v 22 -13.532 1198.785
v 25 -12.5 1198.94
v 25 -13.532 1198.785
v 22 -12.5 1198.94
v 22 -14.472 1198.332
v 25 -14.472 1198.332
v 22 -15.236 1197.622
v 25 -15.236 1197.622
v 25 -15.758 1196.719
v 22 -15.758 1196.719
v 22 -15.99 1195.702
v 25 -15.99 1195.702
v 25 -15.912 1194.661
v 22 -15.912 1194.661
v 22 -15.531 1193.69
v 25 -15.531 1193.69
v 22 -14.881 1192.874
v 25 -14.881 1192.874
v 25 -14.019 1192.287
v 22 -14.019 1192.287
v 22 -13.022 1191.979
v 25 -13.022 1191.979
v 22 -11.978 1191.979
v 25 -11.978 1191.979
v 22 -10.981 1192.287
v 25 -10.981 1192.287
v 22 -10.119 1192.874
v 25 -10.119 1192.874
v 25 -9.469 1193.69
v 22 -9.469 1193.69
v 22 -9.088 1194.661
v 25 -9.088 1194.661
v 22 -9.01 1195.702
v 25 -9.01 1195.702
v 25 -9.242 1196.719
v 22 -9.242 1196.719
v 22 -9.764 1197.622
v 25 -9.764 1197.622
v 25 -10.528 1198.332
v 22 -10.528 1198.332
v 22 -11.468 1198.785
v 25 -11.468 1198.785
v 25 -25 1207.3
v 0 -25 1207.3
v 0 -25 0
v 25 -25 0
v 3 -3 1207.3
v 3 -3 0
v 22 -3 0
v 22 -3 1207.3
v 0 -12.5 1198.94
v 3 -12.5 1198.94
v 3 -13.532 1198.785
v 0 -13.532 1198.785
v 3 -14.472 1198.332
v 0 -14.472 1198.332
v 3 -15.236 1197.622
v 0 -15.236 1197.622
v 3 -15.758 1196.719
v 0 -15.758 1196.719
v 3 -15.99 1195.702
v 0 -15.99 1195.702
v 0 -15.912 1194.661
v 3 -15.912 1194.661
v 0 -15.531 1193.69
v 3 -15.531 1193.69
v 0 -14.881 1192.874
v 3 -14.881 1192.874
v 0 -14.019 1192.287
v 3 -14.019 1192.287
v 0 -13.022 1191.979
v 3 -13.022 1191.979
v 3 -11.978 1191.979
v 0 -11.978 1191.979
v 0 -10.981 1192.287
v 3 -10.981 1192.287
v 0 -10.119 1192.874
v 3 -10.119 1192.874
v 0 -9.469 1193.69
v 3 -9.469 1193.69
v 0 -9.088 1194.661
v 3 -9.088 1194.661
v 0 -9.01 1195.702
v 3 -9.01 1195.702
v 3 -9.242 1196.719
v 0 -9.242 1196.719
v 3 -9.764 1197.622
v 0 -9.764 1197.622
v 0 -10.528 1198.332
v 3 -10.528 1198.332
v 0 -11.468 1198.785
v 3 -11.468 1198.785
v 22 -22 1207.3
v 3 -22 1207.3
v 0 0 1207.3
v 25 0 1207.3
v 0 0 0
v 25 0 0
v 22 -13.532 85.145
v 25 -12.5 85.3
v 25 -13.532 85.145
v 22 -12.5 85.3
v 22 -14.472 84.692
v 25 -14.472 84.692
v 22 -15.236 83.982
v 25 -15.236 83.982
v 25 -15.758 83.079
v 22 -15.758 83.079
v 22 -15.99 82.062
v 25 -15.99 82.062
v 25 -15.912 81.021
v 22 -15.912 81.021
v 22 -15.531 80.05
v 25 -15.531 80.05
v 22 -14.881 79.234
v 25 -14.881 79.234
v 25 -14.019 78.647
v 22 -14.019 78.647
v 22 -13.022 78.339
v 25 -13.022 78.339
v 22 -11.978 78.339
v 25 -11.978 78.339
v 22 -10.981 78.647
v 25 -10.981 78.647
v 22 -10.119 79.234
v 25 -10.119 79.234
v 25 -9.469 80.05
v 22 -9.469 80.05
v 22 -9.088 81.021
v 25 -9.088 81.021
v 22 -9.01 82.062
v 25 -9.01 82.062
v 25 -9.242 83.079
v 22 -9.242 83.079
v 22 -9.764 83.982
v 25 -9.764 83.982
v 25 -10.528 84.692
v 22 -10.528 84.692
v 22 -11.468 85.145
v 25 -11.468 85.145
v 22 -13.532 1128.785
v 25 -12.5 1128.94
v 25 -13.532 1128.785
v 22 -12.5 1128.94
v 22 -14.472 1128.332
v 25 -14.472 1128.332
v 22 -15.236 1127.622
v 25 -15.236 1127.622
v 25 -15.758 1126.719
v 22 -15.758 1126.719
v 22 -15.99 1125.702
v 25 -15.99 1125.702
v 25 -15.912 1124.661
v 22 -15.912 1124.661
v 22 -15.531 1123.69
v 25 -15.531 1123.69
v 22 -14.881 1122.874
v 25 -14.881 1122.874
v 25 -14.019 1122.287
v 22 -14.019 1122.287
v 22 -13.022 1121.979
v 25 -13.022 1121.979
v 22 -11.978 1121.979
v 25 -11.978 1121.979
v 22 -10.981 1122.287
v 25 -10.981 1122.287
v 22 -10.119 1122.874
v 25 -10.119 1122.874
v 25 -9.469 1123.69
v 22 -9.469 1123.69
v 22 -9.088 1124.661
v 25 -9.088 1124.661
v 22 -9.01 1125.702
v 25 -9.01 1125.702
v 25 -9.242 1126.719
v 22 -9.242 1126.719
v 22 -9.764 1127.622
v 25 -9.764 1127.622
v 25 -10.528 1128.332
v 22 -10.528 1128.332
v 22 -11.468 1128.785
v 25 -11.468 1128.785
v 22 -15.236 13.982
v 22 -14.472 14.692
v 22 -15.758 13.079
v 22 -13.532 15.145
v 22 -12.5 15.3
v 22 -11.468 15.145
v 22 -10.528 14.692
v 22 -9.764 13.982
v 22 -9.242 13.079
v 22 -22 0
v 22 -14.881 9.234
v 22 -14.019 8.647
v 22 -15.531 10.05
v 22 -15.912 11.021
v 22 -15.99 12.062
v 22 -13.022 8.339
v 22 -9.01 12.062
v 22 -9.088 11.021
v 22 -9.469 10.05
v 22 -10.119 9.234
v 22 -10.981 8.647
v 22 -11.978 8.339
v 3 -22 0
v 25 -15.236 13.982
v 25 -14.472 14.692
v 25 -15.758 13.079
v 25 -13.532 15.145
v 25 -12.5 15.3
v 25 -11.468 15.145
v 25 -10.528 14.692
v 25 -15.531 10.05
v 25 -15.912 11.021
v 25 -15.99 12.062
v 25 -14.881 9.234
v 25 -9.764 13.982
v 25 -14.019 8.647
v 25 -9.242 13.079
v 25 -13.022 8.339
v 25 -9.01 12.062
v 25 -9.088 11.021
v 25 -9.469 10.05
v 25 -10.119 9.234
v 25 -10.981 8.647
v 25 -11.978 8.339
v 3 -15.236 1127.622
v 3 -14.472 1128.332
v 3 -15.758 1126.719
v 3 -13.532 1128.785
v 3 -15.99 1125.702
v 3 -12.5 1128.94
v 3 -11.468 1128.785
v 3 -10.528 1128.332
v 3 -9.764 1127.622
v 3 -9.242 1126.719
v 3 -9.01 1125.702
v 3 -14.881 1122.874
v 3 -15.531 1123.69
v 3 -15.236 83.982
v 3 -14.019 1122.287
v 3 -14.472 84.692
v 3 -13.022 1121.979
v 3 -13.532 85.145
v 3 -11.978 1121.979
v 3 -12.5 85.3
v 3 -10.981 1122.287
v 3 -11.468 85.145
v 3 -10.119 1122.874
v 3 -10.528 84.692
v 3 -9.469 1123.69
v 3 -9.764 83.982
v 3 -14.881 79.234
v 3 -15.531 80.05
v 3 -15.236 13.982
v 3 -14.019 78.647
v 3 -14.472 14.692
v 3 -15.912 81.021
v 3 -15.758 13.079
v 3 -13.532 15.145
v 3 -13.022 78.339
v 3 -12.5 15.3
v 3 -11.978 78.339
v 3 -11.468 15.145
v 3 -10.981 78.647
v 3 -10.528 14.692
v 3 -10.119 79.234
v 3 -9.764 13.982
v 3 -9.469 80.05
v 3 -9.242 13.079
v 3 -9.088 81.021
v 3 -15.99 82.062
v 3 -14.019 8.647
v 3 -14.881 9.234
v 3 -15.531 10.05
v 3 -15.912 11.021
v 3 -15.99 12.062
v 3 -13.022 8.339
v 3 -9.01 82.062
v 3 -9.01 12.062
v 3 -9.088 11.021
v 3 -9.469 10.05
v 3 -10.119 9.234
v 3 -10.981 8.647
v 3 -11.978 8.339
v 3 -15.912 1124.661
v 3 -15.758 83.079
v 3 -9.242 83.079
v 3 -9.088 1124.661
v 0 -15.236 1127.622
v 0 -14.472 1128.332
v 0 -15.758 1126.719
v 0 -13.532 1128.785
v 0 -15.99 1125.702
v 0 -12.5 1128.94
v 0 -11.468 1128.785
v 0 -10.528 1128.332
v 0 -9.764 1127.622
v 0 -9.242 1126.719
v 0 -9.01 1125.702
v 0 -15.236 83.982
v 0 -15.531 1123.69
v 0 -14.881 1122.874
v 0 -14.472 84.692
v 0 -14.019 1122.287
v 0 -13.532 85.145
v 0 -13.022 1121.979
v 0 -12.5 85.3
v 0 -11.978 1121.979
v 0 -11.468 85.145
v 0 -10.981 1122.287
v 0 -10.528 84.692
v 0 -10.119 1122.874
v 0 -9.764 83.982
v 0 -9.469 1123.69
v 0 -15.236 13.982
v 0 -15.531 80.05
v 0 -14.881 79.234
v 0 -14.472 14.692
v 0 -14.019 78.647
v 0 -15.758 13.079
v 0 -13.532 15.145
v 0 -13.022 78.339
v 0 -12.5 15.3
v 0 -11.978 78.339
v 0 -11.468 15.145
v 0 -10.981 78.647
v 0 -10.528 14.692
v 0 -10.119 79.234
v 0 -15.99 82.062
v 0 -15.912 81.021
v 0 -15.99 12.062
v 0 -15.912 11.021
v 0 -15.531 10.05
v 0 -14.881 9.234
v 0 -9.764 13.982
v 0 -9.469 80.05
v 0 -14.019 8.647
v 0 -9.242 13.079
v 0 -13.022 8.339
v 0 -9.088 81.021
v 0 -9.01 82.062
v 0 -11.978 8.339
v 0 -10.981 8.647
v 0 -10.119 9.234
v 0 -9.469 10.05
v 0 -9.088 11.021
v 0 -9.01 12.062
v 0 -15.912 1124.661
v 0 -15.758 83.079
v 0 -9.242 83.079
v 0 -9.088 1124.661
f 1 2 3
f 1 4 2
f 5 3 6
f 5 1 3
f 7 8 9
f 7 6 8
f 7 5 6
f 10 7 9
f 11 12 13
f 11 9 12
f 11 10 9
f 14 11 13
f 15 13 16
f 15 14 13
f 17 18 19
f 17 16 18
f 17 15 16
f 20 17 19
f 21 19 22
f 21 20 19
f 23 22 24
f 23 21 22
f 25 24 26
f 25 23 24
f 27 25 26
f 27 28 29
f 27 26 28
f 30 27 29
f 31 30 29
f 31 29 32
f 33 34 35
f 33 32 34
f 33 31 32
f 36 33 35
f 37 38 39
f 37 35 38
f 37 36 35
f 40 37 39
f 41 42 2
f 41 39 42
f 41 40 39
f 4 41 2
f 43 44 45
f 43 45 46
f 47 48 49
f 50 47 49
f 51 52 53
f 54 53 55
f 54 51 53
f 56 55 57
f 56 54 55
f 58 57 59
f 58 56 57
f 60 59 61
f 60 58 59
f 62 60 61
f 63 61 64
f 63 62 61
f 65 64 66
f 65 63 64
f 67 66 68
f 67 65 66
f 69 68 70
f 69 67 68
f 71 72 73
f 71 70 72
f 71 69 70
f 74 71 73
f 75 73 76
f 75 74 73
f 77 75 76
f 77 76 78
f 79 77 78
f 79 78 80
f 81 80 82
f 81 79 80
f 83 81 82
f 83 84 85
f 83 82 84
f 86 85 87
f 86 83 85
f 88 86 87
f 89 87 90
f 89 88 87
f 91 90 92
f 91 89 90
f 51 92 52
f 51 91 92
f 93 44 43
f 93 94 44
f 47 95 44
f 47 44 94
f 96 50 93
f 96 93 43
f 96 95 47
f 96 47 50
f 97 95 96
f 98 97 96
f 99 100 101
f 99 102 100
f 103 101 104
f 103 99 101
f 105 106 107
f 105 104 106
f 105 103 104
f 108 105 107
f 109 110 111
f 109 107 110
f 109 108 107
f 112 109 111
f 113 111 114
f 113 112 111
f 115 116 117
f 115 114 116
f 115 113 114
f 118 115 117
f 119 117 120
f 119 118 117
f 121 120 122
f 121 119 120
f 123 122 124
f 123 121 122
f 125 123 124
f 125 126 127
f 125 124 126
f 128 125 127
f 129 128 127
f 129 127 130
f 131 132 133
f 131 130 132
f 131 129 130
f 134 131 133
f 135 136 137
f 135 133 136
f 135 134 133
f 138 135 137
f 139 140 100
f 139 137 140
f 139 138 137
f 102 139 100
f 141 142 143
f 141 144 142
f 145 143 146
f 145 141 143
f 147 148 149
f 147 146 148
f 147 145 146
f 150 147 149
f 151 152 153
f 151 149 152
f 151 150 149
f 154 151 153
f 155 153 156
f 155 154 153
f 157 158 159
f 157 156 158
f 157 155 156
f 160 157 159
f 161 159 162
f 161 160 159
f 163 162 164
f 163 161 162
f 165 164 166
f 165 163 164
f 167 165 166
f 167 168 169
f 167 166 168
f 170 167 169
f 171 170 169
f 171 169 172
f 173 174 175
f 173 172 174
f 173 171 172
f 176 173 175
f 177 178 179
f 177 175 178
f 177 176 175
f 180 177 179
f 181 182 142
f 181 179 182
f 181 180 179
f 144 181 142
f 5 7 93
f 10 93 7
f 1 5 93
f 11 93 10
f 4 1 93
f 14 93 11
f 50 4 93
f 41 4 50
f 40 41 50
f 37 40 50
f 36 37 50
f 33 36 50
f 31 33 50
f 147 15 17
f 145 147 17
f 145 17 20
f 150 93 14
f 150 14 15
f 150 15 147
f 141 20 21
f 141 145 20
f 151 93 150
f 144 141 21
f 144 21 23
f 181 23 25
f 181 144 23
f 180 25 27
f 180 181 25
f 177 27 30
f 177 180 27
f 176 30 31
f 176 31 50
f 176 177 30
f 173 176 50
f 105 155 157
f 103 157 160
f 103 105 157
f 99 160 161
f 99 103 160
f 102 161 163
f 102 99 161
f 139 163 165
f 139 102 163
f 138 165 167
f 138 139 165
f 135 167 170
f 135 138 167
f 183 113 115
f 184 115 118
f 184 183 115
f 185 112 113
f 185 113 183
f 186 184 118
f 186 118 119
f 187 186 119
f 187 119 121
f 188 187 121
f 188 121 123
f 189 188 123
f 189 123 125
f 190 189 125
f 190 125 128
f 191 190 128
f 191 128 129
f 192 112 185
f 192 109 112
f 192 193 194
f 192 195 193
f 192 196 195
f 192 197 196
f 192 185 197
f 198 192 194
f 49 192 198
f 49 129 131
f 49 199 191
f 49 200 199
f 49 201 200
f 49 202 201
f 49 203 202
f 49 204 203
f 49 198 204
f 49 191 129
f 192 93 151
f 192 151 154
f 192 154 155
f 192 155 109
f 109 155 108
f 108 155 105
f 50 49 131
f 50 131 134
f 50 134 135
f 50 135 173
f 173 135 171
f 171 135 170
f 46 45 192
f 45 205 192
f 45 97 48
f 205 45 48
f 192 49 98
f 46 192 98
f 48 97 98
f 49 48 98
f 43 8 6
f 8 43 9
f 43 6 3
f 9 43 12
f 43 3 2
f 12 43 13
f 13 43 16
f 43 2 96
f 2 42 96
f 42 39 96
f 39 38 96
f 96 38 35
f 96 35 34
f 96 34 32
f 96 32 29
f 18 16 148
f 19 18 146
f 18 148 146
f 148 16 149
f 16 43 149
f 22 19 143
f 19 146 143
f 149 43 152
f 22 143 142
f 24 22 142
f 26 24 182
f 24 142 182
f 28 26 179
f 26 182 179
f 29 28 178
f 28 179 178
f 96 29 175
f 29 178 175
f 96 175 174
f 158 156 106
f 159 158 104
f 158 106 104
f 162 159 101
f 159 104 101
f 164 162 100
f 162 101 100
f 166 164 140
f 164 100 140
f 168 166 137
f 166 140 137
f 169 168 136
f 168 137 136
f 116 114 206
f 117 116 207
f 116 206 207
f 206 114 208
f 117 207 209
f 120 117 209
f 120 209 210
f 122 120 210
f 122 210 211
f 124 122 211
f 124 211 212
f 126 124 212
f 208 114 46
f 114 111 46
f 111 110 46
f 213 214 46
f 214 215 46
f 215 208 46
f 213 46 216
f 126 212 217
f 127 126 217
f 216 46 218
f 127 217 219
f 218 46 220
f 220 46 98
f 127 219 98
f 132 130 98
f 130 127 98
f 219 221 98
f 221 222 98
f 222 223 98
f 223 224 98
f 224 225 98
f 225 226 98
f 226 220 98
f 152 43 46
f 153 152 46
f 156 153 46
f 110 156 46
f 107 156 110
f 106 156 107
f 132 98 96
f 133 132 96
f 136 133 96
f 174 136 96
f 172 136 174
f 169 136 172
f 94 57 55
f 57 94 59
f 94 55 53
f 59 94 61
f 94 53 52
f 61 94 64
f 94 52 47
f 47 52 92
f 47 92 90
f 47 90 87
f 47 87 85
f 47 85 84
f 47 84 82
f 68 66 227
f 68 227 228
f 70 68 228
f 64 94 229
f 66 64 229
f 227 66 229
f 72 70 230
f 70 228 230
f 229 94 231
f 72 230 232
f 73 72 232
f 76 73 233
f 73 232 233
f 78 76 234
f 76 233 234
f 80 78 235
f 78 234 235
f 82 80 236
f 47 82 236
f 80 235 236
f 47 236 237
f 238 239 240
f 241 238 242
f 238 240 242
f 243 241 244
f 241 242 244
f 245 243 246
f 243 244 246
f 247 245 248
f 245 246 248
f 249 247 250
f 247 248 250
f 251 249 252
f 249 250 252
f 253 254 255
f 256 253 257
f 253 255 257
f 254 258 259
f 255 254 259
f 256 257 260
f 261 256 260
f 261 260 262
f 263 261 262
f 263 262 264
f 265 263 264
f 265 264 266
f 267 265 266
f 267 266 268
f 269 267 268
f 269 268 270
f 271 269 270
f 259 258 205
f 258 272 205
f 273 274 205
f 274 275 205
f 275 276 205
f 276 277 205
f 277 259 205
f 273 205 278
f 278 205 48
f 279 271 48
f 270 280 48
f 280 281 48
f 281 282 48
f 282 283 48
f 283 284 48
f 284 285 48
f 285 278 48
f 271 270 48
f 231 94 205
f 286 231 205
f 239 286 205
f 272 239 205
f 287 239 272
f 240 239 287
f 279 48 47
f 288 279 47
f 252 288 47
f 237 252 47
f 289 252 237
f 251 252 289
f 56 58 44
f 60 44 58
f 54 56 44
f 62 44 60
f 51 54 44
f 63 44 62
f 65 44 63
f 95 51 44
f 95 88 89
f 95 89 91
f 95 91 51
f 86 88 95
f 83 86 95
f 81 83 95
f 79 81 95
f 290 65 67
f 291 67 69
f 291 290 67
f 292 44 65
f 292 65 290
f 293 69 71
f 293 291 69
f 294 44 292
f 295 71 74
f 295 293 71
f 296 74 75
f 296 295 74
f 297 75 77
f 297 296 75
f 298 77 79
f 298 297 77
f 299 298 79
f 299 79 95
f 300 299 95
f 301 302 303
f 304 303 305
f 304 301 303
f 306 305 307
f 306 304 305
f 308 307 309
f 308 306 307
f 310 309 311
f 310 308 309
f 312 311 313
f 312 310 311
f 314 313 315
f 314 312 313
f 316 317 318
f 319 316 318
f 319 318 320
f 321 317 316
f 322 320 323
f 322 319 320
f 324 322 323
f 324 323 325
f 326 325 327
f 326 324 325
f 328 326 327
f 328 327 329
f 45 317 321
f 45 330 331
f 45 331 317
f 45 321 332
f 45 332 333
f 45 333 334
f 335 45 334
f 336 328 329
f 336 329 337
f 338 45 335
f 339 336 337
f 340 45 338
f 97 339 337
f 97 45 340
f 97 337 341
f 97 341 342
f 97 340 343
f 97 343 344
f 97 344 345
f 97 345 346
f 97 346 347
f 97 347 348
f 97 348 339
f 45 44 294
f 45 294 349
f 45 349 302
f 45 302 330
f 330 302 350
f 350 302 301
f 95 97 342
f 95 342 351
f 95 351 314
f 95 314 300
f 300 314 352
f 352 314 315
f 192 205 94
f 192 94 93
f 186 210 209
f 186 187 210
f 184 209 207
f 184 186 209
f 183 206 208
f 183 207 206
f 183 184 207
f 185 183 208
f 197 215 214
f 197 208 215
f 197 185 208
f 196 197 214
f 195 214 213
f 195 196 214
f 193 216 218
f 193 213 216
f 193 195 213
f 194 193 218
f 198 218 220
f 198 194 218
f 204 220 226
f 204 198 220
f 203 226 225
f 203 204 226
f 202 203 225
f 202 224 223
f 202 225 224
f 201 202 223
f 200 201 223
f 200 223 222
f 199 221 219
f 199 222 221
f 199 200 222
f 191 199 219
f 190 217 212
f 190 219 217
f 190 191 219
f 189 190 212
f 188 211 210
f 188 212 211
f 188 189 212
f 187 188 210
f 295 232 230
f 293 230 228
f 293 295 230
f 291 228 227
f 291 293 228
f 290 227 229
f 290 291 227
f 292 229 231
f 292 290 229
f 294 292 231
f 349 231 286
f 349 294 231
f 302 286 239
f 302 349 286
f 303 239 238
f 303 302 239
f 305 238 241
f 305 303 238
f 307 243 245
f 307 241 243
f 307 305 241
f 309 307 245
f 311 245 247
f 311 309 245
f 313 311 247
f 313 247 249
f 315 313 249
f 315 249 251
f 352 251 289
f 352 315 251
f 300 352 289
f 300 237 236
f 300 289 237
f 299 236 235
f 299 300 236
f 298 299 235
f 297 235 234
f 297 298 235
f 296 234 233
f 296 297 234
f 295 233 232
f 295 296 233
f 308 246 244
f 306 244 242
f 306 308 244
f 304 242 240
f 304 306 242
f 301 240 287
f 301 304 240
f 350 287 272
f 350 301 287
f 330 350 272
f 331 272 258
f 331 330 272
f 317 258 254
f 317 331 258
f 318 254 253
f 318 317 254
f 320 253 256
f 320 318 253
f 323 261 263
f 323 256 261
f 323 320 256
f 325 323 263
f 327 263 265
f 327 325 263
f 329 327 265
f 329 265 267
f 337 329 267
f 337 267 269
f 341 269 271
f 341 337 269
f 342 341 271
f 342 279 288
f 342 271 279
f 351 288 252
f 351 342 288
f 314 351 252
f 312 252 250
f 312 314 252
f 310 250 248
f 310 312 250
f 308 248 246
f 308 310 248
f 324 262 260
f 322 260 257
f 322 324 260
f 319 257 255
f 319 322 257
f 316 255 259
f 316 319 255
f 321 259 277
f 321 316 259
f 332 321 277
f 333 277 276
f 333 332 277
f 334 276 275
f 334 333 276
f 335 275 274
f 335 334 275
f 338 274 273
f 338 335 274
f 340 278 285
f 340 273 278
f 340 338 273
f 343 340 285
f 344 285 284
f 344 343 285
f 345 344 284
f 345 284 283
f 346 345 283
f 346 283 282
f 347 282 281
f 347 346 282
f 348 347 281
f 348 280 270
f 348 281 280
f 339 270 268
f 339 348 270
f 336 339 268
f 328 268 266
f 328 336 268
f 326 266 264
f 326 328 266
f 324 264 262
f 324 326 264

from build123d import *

# Parameters (mm, degrees)
SKETCH_1_W                     = 25
SKETCH_1_H                     = 25
SKETCH_1_W_2                   = 19
SKETCH_1_H_2                   = 19
EXTRUDE_1_DEPTH                = 1207.3
HOLE_WIZARD_7_0_7_1_AT_2_COUNT = 2
HOLE_WIZARD_7_0_7_1_AT_2_PITCH = 70
PATTERN_LINEAR_1_COUNT         = 2
PATTERN_LINEAR_1_PITCH         = 1113.64


with BuildPart() as part:
    # 草图1 → 拉伸1 (new body)
    with BuildSketch(Plane.XY):
        with Locations((12.5, -12.5)):
            Rectangle(SKETCH_1_W, SKETCH_1_H)
        with Locations((12.5, -12.5)):
            Rectangle(SKETCH_1_W_2, SKETCH_1_H_2, mode=Mode.SUBTRACT)
    extrude(amount=EXTRUDE_1_DEPTH)

    # 草图4 → Ø7.0 (7) 直径孔1 (revolve, cut)
    with BuildSketch(Plane(origin=(0, -12.5, 11.8), x_dir=(0, 0, 1), z_dir=(0, 1, 0))):
        Polygon((0, 0), (0, 32.103012167), (3.5, 30), (3.5, 0), align=None)
    hole_wizard_7_0_7_1 = revolve(axis=Axis((-6.35, -12.5, 11.8), (1, 0, 0)), mode=Mode.SUBTRACT)

    # Ø7.0 (7) 直径孔1 at 2: Ø7.0 (7) 直径孔1 ×2
    with Locations(*[(0, 0, i * HOLE_WIZARD_7_0_7_1_AT_2_PITCH) for i in range(1, HOLE_WIZARD_7_0_7_1_AT_2_COUNT)]):
        add(hole_wizard_7_0_7_1, mode=Mode.SUBTRACT)

    # 阵列(线性)1: Ø7.0 (7) 直径孔1 ×2
    with Locations(*[(0, 0, i * PATTERN_LINEAR_1_PITCH) for i in range(1, PATTERN_LINEAR_1_COUNT)]):
        add(hole_wizard_7_0_7_1, mode=Mode.SUBTRACT)

    # 阵列(线性)1 copy 1 sketch → 阵列(线性)1 copy 1 (revolve, cut)
    with BuildSketch(Plane(origin=(0, -12.5, 1195.44), x_dir=(0, 0, 1), z_dir=(0, 1, 0))):
        Polygon((0, 0), (0, 32.103012167), (3.5, 30), (3.5, 0), align=None)
    revolve(axis=Axis((-6.35, -12.5, 1195.44), (1, 0, 0)), mode=Mode.SUBTRACT)


solid = part.part
